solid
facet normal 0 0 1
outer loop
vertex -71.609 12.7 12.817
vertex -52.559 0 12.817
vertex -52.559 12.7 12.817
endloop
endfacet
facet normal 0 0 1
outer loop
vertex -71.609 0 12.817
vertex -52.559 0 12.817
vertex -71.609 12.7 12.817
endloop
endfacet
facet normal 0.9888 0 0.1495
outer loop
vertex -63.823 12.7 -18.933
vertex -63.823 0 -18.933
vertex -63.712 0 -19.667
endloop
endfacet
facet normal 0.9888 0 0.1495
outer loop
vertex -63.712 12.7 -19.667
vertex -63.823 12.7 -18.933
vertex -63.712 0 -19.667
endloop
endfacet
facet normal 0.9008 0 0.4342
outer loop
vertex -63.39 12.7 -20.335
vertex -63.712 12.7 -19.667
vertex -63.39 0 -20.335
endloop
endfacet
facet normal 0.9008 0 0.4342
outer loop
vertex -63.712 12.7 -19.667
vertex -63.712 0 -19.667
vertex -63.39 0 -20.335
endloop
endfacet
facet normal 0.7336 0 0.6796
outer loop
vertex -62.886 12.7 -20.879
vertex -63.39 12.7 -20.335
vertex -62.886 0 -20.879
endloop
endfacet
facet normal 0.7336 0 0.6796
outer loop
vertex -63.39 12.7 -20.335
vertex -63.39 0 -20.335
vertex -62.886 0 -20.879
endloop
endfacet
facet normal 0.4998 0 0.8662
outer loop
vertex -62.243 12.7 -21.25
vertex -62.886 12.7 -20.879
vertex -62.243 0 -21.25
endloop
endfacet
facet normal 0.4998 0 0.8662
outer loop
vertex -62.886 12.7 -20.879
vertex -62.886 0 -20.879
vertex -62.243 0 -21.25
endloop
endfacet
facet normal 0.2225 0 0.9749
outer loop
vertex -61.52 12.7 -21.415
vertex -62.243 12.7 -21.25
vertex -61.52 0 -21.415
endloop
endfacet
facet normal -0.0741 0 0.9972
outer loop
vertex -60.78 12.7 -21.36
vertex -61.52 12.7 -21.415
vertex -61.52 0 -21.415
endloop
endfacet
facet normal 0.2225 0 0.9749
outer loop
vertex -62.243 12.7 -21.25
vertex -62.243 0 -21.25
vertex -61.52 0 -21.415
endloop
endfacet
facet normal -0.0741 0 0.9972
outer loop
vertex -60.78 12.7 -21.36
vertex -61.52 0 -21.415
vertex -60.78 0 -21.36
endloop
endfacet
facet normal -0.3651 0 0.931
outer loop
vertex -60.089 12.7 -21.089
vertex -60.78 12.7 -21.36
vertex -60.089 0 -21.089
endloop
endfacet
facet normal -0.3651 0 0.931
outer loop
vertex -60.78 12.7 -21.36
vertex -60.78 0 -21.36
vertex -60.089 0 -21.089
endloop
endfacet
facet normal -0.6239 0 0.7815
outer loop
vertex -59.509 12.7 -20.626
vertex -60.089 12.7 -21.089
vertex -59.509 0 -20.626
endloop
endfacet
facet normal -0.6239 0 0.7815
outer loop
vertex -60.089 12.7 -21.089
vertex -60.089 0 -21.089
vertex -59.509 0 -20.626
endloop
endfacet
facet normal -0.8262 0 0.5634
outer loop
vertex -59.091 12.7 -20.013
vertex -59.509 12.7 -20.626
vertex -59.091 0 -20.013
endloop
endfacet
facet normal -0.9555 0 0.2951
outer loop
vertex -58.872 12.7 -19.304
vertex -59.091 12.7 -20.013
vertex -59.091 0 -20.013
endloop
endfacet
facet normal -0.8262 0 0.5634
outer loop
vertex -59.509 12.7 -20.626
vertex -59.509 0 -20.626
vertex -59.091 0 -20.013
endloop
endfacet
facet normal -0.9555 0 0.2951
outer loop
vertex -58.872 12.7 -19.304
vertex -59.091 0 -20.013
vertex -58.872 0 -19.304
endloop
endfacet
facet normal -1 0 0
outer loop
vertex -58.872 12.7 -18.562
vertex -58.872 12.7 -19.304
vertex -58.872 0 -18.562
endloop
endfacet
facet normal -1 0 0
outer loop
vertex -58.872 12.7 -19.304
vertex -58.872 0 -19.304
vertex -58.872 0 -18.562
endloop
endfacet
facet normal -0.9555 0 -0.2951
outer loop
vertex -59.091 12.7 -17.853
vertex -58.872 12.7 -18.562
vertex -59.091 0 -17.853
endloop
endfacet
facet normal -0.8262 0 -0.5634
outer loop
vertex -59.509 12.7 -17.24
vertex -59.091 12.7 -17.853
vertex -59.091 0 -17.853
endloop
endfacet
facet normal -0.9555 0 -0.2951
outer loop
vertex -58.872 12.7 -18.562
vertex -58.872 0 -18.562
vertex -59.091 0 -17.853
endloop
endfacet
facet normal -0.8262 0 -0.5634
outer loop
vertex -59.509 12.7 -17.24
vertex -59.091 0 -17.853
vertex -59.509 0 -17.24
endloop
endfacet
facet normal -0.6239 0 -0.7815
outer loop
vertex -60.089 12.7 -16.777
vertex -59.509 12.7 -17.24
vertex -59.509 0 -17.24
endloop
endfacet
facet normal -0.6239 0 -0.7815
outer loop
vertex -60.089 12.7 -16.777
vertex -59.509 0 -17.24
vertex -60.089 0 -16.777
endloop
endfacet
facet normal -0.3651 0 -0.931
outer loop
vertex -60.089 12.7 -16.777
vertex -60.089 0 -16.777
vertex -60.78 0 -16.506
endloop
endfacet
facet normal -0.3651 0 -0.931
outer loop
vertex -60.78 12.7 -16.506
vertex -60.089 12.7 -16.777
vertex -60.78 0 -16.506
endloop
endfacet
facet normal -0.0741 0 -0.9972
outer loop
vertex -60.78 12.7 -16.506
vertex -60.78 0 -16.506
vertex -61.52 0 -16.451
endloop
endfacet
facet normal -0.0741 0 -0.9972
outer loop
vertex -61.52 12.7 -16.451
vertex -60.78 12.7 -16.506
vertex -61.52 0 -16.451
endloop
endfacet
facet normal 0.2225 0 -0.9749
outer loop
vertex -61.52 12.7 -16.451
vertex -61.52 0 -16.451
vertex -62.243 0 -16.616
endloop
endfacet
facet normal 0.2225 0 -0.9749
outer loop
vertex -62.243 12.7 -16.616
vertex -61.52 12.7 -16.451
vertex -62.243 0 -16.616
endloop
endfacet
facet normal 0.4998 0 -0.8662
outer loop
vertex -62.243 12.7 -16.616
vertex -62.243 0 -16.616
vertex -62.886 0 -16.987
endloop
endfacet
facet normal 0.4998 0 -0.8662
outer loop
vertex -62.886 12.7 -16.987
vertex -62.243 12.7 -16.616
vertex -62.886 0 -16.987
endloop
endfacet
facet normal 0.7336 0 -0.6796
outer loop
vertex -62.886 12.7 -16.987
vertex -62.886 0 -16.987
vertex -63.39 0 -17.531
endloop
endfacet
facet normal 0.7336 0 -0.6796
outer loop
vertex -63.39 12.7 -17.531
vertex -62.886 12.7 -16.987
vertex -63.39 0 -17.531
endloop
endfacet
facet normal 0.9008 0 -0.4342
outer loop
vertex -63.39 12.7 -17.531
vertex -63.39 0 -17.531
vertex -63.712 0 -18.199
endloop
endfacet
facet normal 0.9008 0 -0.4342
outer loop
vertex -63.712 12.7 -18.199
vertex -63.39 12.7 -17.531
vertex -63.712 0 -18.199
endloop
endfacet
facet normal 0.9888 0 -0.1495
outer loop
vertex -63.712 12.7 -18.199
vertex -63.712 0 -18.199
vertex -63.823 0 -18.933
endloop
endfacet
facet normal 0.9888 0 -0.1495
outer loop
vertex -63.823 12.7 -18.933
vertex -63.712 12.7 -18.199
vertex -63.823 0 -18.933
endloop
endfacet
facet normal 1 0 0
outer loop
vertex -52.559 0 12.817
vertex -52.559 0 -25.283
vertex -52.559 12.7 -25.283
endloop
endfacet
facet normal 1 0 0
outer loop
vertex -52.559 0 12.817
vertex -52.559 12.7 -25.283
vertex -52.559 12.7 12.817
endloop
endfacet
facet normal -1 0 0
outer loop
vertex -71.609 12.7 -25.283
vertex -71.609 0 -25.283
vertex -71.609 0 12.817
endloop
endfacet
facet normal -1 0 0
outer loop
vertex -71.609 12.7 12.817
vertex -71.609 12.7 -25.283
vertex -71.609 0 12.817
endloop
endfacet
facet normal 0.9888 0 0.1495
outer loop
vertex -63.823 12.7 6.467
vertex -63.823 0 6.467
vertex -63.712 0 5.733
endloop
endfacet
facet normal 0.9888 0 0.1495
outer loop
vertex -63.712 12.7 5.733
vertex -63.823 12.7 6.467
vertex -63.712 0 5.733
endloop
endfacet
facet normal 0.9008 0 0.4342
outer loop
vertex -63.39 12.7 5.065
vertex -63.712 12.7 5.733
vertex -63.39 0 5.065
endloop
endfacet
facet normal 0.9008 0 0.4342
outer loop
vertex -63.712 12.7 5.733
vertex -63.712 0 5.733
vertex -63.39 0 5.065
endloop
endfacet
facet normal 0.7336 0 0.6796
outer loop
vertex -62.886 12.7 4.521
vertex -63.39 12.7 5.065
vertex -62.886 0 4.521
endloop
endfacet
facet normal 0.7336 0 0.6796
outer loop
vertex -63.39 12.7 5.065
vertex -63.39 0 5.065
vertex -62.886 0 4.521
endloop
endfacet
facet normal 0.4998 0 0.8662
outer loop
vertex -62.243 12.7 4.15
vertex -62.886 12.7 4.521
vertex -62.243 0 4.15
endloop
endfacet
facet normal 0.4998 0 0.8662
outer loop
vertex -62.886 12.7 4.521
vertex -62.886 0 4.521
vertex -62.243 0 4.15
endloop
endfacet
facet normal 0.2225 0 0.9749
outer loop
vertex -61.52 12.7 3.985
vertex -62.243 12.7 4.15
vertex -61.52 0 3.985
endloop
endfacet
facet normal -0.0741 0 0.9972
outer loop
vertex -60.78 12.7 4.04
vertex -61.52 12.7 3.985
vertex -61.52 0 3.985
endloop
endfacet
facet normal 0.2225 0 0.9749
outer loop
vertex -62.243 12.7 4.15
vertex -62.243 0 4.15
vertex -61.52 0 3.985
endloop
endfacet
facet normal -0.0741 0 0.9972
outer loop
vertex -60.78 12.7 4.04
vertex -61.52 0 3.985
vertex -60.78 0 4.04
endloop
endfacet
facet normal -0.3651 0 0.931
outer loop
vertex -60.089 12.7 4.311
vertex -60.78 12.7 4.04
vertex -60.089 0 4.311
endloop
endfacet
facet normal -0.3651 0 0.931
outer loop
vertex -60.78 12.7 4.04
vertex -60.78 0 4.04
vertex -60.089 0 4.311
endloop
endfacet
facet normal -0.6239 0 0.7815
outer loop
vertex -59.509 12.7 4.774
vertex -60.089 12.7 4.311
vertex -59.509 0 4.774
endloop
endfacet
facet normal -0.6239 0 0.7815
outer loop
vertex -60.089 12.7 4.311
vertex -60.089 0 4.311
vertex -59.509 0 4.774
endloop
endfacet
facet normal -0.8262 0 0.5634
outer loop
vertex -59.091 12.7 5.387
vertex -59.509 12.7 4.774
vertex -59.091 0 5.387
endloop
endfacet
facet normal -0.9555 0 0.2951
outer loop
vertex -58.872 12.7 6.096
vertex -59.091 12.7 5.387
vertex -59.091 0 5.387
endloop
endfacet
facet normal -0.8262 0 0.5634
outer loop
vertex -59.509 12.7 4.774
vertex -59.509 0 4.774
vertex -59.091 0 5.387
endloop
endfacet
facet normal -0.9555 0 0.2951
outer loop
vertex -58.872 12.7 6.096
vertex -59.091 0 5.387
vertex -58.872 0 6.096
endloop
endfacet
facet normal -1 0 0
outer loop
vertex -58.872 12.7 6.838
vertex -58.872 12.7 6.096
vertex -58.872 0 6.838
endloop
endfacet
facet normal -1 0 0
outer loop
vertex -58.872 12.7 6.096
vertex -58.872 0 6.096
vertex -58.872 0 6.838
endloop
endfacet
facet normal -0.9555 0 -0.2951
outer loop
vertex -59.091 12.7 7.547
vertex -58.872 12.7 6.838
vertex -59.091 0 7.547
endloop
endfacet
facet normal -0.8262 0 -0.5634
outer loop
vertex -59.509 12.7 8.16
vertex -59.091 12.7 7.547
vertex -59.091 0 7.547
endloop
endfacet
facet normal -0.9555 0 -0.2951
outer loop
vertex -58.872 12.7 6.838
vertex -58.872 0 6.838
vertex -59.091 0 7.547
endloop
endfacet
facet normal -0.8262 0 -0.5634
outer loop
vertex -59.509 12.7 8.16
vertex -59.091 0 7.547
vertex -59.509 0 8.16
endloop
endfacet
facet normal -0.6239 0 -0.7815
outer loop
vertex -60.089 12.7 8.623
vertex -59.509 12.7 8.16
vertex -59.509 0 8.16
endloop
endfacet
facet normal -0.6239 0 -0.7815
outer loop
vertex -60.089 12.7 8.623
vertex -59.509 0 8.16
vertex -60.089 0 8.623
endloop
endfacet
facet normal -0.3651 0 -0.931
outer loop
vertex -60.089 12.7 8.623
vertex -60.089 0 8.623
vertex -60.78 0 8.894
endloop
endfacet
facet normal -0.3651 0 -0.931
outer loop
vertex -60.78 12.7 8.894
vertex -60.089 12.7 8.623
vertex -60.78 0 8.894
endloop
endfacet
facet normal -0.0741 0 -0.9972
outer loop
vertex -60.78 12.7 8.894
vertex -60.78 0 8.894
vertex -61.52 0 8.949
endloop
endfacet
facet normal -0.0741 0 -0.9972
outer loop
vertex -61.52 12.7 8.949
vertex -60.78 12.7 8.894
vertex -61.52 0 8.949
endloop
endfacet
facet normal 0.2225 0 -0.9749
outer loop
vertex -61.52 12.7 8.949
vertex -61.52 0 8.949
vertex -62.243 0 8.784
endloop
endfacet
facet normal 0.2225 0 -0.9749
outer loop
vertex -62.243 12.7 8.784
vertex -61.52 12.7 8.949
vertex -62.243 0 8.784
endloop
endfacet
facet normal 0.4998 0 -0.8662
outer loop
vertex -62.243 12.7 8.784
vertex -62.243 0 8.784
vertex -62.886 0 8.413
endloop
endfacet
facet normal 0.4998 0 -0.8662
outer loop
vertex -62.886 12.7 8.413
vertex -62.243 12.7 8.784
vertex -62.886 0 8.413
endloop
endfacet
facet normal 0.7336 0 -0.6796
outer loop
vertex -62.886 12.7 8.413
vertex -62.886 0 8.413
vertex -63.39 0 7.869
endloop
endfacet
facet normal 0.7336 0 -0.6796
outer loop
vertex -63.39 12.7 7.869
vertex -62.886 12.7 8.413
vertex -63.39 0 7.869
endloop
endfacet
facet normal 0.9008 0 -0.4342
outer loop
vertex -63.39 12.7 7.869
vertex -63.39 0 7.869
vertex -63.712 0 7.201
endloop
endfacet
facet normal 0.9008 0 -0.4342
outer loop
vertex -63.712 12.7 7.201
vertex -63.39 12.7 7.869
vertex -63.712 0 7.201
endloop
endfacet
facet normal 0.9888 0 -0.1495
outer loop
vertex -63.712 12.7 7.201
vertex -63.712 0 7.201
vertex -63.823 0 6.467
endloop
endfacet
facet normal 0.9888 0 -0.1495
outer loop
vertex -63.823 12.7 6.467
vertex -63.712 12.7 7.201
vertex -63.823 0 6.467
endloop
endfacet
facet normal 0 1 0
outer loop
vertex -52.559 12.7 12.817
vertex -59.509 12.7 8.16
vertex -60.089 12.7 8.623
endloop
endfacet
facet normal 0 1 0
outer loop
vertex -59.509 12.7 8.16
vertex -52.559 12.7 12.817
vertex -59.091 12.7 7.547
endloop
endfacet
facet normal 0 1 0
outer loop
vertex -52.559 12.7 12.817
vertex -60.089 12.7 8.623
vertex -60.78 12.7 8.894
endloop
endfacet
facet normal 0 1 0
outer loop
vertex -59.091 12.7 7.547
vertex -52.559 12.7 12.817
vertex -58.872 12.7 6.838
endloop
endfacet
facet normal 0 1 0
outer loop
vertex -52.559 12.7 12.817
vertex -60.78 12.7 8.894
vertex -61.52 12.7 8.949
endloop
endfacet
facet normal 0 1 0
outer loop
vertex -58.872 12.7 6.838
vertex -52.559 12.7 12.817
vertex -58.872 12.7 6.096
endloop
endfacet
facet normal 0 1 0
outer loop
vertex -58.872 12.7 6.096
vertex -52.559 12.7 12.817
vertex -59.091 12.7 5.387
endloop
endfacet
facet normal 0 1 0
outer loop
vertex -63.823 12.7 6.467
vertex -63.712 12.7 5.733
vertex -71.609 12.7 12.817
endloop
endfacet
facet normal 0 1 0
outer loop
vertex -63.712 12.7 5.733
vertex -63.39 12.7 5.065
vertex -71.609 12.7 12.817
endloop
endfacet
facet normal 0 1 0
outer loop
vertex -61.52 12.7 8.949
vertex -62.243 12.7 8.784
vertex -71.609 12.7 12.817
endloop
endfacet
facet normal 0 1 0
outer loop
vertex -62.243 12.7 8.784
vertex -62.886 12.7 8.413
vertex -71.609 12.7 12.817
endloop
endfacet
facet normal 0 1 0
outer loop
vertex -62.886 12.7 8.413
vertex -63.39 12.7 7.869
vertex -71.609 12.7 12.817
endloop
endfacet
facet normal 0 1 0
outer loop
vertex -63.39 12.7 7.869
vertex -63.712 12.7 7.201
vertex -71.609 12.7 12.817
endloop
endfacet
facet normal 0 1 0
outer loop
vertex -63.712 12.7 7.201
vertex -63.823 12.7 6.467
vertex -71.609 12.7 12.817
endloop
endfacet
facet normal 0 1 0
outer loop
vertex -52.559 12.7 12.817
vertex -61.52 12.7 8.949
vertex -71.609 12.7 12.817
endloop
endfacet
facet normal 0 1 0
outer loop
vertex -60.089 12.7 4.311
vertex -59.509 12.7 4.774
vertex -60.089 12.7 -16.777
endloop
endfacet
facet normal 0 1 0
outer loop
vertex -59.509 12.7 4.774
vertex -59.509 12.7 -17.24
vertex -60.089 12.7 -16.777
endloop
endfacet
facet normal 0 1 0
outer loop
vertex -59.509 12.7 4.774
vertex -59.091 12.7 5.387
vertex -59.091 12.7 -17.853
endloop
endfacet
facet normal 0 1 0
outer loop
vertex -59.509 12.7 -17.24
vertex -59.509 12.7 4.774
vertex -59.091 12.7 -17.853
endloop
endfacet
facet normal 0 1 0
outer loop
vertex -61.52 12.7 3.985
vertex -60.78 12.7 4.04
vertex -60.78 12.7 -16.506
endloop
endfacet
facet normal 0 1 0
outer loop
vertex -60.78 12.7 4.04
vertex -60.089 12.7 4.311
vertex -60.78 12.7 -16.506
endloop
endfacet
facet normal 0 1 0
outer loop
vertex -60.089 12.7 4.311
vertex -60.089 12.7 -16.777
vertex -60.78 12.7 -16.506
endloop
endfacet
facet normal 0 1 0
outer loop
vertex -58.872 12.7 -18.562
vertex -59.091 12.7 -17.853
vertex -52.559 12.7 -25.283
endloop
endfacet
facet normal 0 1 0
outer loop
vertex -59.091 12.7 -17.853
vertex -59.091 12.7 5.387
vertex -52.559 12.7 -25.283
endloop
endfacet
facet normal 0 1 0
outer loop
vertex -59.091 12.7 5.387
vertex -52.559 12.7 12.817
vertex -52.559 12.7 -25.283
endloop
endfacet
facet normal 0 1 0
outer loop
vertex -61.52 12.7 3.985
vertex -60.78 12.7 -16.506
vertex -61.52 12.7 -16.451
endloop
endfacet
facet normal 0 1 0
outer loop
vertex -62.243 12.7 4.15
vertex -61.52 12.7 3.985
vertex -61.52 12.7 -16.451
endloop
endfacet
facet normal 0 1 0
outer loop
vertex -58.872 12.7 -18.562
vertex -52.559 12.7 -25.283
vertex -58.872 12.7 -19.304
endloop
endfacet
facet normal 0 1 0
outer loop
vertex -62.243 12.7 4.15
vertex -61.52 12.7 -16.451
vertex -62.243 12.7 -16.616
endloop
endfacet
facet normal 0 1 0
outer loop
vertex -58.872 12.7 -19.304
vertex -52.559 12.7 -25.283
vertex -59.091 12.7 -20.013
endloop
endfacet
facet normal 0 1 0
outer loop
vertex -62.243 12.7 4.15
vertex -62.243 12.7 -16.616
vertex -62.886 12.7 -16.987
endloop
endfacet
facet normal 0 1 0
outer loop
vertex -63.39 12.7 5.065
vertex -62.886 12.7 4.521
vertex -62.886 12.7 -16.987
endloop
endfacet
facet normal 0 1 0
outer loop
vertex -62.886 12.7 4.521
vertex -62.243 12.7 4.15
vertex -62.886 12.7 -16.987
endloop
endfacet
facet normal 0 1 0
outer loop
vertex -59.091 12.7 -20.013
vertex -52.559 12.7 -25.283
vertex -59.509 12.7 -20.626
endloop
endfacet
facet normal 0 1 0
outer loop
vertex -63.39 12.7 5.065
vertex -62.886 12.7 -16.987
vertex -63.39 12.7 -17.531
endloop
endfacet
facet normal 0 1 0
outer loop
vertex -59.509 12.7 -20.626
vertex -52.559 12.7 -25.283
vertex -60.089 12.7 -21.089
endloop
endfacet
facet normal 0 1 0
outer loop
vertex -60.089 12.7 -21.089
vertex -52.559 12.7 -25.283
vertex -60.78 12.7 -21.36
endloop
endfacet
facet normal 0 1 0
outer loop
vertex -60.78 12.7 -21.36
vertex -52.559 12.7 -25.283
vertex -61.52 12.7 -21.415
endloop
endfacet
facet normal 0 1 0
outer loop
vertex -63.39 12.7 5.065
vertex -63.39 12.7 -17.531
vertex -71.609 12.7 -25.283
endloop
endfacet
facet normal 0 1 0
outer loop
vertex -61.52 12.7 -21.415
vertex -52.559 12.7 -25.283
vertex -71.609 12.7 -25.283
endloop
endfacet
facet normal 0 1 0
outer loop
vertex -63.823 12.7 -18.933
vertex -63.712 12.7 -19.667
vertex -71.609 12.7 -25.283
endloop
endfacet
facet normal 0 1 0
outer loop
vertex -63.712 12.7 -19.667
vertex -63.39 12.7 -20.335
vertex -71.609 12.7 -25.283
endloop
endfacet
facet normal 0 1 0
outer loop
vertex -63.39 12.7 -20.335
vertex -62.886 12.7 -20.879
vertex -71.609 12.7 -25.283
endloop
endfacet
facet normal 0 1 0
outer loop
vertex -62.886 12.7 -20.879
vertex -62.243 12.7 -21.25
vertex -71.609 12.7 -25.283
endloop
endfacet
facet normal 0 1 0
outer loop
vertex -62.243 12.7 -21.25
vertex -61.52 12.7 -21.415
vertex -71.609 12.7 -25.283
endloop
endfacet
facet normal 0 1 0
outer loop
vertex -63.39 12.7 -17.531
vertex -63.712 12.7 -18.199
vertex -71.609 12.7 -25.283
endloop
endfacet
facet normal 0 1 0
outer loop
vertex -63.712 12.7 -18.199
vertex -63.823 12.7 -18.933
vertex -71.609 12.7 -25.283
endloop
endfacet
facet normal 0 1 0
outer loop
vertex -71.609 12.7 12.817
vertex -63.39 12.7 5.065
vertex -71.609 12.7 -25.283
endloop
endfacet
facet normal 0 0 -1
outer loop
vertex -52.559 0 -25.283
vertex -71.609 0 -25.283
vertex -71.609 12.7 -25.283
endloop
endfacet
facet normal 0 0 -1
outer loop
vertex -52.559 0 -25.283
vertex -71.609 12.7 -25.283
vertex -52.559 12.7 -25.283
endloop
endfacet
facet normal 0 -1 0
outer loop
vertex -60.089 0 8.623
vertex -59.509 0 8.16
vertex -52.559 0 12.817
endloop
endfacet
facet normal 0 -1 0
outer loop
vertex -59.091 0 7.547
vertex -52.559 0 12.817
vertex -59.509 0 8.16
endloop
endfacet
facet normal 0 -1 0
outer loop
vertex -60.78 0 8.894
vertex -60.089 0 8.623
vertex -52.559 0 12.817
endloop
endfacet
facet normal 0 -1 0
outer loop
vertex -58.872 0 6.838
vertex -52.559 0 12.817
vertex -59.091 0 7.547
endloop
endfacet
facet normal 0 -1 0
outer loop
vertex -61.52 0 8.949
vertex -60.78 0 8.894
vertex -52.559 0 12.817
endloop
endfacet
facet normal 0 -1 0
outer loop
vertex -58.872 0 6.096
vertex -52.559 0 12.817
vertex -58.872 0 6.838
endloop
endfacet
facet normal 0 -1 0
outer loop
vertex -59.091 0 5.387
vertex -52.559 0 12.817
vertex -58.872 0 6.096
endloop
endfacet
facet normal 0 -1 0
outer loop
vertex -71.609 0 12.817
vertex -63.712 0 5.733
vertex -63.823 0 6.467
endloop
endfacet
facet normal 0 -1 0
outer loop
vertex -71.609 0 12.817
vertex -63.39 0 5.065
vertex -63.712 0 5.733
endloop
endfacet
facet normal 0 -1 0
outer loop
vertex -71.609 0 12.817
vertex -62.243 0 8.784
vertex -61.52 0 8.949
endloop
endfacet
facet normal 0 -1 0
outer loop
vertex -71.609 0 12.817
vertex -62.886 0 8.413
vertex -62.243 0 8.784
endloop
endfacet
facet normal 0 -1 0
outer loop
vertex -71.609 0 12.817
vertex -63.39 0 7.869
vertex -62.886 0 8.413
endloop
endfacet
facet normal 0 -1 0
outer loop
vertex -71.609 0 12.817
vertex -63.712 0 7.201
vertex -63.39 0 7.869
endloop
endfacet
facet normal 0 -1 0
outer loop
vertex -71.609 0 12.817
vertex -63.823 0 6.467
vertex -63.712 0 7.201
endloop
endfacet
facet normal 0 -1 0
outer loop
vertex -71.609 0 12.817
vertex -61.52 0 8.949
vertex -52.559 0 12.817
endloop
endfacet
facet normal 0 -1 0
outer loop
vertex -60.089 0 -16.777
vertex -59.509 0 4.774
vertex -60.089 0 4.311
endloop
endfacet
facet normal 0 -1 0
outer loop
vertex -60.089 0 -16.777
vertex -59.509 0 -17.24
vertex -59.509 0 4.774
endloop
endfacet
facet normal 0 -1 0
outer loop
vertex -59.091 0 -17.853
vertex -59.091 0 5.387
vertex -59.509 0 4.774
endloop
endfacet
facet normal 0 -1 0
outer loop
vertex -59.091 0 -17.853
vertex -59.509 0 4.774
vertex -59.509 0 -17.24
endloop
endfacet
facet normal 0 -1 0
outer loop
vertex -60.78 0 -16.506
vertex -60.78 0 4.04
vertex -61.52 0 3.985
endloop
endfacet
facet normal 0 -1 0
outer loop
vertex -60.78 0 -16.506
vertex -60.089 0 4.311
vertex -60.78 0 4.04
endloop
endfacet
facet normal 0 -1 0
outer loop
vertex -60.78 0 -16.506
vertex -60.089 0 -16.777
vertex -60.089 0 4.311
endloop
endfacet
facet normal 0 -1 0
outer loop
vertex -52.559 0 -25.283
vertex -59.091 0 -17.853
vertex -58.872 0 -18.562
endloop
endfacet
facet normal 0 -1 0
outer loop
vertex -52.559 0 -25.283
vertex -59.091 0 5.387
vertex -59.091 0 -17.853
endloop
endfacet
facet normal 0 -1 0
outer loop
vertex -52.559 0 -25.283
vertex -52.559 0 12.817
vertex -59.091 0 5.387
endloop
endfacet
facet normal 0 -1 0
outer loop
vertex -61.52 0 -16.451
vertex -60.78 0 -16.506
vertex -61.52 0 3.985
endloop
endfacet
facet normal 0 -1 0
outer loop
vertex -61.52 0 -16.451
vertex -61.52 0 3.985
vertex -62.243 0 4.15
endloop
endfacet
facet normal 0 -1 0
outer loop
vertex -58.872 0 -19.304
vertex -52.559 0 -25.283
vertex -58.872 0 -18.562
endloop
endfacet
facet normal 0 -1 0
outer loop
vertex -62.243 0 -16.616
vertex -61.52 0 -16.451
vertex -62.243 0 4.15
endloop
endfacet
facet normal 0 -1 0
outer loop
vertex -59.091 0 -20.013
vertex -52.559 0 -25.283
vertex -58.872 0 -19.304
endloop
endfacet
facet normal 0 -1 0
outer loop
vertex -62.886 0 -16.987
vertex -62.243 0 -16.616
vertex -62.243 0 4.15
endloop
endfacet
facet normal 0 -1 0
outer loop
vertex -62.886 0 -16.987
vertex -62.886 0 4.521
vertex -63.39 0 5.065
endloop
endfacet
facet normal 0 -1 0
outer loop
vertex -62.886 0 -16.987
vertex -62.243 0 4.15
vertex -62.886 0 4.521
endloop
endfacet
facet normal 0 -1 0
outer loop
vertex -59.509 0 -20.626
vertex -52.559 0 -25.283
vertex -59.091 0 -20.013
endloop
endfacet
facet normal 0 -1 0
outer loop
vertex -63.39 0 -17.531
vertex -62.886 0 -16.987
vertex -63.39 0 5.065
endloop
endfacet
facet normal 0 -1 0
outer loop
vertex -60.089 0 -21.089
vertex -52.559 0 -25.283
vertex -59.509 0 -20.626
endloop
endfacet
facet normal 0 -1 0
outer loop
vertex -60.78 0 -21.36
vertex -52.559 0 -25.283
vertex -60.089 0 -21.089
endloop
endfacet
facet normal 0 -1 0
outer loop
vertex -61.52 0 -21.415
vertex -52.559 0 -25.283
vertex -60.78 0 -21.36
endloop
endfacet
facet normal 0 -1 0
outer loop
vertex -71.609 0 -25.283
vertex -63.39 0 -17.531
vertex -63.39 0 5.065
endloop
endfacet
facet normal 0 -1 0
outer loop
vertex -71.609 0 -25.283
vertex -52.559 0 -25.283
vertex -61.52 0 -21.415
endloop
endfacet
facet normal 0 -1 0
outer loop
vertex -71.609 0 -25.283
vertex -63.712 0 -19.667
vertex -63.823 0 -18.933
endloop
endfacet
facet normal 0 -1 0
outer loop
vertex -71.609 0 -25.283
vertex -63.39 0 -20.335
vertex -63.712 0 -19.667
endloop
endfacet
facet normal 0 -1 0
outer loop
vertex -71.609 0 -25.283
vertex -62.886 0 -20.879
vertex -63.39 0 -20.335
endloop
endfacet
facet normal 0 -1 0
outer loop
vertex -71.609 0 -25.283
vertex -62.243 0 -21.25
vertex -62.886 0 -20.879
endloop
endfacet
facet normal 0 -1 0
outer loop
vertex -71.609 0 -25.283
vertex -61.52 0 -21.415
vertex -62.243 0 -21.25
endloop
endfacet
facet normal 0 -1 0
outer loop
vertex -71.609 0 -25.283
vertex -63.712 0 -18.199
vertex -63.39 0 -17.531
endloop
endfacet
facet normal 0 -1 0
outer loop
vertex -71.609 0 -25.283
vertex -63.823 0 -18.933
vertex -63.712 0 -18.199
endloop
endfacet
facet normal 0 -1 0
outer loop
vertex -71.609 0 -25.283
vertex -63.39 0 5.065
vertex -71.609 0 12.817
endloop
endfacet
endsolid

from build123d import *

# Parameters (mm, degrees)
BOSS_EXTRUDE1_DEPTH    = 12.7
F_10_CLEARANCE_HOLE1_D = 4.9784


with BuildPart() as part:
    # Sketch4 → Boss-Extrude1 (new body)
    with BuildSketch(Plane(origin=(0, 0, 0), x_dir=(1, 0, 0), z_dir=(0, 1, 0))):
        Polygon((-71.608792588, 6.232898137), (-71.608792588, 25.282898137), (-52.558792588, 25.282898137), (-52.558792588, -12.817101863), (-71.608792588, -12.817101863), align=None)
    extrude(amount=BOSS_EXTRUDE1_DEPTH)

    # #10 Clearance Hole1 (through all)
    with Locations(Plane(origin=(0, 12.7, 0), x_dir=(1, 0, 0), z_dir=(0, 1, 0))):
        with Locations((-61.333792588, 18.932898137), (-61.333792588, -6.467101863)):
            Hole(F_10_CLEARANCE_HOLE1_D / 2)


solid = part.part
